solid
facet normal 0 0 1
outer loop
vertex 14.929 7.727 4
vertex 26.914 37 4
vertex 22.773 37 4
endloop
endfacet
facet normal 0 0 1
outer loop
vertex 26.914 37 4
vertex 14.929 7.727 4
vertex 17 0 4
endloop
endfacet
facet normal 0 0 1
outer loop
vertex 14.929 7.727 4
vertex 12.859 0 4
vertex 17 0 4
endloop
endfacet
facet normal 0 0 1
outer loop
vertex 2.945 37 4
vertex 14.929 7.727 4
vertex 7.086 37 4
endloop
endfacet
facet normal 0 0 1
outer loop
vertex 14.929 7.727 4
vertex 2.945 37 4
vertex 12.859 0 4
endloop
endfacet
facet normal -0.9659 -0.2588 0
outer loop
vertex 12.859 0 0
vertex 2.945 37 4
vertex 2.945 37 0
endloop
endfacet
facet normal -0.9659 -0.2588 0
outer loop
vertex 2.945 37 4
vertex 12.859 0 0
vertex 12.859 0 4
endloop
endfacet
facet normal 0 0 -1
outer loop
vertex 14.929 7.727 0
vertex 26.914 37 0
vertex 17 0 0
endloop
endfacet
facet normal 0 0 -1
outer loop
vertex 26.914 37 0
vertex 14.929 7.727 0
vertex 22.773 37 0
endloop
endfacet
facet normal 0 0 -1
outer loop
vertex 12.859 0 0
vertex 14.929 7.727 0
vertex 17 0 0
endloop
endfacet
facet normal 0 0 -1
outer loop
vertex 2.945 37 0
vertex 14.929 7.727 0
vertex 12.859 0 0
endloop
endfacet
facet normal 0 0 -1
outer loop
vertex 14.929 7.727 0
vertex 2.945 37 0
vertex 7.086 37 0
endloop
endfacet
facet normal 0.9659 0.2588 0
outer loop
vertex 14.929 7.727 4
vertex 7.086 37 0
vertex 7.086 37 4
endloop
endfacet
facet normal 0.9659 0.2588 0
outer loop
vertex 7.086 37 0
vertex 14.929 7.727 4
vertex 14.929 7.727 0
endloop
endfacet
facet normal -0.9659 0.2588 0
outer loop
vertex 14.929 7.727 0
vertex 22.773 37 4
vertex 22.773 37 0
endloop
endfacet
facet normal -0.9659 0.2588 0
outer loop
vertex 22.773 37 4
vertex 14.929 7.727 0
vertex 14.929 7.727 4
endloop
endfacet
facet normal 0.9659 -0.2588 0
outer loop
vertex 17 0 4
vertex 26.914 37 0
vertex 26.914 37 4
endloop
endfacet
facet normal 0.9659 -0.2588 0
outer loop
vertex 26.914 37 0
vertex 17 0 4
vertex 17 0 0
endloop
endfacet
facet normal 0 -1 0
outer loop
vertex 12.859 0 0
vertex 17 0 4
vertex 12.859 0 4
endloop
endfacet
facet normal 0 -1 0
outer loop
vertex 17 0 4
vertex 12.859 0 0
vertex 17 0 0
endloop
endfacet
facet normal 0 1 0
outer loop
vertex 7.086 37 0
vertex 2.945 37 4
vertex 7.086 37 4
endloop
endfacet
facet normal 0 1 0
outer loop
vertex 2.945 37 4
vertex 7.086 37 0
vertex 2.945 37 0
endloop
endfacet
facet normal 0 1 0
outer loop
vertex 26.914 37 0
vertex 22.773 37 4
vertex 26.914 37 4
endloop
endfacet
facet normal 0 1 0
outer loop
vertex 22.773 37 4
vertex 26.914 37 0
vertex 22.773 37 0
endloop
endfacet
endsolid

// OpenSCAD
x=4;
difference(){
union(){
//w
translate([0,0,0])
  rotate([0,0,90])
union(){
  translate([0,-17,0]) rotate([0,0,15]) cube([40,x,x]);
  translate([0,-17,0]) rotate([0,0,-15]) cube([40,x,x]);


}
}
	#translate([0,-8,0]) cube([60,8,6]);
	#translate([0,37,0]) cube([60,8,6]);
}
